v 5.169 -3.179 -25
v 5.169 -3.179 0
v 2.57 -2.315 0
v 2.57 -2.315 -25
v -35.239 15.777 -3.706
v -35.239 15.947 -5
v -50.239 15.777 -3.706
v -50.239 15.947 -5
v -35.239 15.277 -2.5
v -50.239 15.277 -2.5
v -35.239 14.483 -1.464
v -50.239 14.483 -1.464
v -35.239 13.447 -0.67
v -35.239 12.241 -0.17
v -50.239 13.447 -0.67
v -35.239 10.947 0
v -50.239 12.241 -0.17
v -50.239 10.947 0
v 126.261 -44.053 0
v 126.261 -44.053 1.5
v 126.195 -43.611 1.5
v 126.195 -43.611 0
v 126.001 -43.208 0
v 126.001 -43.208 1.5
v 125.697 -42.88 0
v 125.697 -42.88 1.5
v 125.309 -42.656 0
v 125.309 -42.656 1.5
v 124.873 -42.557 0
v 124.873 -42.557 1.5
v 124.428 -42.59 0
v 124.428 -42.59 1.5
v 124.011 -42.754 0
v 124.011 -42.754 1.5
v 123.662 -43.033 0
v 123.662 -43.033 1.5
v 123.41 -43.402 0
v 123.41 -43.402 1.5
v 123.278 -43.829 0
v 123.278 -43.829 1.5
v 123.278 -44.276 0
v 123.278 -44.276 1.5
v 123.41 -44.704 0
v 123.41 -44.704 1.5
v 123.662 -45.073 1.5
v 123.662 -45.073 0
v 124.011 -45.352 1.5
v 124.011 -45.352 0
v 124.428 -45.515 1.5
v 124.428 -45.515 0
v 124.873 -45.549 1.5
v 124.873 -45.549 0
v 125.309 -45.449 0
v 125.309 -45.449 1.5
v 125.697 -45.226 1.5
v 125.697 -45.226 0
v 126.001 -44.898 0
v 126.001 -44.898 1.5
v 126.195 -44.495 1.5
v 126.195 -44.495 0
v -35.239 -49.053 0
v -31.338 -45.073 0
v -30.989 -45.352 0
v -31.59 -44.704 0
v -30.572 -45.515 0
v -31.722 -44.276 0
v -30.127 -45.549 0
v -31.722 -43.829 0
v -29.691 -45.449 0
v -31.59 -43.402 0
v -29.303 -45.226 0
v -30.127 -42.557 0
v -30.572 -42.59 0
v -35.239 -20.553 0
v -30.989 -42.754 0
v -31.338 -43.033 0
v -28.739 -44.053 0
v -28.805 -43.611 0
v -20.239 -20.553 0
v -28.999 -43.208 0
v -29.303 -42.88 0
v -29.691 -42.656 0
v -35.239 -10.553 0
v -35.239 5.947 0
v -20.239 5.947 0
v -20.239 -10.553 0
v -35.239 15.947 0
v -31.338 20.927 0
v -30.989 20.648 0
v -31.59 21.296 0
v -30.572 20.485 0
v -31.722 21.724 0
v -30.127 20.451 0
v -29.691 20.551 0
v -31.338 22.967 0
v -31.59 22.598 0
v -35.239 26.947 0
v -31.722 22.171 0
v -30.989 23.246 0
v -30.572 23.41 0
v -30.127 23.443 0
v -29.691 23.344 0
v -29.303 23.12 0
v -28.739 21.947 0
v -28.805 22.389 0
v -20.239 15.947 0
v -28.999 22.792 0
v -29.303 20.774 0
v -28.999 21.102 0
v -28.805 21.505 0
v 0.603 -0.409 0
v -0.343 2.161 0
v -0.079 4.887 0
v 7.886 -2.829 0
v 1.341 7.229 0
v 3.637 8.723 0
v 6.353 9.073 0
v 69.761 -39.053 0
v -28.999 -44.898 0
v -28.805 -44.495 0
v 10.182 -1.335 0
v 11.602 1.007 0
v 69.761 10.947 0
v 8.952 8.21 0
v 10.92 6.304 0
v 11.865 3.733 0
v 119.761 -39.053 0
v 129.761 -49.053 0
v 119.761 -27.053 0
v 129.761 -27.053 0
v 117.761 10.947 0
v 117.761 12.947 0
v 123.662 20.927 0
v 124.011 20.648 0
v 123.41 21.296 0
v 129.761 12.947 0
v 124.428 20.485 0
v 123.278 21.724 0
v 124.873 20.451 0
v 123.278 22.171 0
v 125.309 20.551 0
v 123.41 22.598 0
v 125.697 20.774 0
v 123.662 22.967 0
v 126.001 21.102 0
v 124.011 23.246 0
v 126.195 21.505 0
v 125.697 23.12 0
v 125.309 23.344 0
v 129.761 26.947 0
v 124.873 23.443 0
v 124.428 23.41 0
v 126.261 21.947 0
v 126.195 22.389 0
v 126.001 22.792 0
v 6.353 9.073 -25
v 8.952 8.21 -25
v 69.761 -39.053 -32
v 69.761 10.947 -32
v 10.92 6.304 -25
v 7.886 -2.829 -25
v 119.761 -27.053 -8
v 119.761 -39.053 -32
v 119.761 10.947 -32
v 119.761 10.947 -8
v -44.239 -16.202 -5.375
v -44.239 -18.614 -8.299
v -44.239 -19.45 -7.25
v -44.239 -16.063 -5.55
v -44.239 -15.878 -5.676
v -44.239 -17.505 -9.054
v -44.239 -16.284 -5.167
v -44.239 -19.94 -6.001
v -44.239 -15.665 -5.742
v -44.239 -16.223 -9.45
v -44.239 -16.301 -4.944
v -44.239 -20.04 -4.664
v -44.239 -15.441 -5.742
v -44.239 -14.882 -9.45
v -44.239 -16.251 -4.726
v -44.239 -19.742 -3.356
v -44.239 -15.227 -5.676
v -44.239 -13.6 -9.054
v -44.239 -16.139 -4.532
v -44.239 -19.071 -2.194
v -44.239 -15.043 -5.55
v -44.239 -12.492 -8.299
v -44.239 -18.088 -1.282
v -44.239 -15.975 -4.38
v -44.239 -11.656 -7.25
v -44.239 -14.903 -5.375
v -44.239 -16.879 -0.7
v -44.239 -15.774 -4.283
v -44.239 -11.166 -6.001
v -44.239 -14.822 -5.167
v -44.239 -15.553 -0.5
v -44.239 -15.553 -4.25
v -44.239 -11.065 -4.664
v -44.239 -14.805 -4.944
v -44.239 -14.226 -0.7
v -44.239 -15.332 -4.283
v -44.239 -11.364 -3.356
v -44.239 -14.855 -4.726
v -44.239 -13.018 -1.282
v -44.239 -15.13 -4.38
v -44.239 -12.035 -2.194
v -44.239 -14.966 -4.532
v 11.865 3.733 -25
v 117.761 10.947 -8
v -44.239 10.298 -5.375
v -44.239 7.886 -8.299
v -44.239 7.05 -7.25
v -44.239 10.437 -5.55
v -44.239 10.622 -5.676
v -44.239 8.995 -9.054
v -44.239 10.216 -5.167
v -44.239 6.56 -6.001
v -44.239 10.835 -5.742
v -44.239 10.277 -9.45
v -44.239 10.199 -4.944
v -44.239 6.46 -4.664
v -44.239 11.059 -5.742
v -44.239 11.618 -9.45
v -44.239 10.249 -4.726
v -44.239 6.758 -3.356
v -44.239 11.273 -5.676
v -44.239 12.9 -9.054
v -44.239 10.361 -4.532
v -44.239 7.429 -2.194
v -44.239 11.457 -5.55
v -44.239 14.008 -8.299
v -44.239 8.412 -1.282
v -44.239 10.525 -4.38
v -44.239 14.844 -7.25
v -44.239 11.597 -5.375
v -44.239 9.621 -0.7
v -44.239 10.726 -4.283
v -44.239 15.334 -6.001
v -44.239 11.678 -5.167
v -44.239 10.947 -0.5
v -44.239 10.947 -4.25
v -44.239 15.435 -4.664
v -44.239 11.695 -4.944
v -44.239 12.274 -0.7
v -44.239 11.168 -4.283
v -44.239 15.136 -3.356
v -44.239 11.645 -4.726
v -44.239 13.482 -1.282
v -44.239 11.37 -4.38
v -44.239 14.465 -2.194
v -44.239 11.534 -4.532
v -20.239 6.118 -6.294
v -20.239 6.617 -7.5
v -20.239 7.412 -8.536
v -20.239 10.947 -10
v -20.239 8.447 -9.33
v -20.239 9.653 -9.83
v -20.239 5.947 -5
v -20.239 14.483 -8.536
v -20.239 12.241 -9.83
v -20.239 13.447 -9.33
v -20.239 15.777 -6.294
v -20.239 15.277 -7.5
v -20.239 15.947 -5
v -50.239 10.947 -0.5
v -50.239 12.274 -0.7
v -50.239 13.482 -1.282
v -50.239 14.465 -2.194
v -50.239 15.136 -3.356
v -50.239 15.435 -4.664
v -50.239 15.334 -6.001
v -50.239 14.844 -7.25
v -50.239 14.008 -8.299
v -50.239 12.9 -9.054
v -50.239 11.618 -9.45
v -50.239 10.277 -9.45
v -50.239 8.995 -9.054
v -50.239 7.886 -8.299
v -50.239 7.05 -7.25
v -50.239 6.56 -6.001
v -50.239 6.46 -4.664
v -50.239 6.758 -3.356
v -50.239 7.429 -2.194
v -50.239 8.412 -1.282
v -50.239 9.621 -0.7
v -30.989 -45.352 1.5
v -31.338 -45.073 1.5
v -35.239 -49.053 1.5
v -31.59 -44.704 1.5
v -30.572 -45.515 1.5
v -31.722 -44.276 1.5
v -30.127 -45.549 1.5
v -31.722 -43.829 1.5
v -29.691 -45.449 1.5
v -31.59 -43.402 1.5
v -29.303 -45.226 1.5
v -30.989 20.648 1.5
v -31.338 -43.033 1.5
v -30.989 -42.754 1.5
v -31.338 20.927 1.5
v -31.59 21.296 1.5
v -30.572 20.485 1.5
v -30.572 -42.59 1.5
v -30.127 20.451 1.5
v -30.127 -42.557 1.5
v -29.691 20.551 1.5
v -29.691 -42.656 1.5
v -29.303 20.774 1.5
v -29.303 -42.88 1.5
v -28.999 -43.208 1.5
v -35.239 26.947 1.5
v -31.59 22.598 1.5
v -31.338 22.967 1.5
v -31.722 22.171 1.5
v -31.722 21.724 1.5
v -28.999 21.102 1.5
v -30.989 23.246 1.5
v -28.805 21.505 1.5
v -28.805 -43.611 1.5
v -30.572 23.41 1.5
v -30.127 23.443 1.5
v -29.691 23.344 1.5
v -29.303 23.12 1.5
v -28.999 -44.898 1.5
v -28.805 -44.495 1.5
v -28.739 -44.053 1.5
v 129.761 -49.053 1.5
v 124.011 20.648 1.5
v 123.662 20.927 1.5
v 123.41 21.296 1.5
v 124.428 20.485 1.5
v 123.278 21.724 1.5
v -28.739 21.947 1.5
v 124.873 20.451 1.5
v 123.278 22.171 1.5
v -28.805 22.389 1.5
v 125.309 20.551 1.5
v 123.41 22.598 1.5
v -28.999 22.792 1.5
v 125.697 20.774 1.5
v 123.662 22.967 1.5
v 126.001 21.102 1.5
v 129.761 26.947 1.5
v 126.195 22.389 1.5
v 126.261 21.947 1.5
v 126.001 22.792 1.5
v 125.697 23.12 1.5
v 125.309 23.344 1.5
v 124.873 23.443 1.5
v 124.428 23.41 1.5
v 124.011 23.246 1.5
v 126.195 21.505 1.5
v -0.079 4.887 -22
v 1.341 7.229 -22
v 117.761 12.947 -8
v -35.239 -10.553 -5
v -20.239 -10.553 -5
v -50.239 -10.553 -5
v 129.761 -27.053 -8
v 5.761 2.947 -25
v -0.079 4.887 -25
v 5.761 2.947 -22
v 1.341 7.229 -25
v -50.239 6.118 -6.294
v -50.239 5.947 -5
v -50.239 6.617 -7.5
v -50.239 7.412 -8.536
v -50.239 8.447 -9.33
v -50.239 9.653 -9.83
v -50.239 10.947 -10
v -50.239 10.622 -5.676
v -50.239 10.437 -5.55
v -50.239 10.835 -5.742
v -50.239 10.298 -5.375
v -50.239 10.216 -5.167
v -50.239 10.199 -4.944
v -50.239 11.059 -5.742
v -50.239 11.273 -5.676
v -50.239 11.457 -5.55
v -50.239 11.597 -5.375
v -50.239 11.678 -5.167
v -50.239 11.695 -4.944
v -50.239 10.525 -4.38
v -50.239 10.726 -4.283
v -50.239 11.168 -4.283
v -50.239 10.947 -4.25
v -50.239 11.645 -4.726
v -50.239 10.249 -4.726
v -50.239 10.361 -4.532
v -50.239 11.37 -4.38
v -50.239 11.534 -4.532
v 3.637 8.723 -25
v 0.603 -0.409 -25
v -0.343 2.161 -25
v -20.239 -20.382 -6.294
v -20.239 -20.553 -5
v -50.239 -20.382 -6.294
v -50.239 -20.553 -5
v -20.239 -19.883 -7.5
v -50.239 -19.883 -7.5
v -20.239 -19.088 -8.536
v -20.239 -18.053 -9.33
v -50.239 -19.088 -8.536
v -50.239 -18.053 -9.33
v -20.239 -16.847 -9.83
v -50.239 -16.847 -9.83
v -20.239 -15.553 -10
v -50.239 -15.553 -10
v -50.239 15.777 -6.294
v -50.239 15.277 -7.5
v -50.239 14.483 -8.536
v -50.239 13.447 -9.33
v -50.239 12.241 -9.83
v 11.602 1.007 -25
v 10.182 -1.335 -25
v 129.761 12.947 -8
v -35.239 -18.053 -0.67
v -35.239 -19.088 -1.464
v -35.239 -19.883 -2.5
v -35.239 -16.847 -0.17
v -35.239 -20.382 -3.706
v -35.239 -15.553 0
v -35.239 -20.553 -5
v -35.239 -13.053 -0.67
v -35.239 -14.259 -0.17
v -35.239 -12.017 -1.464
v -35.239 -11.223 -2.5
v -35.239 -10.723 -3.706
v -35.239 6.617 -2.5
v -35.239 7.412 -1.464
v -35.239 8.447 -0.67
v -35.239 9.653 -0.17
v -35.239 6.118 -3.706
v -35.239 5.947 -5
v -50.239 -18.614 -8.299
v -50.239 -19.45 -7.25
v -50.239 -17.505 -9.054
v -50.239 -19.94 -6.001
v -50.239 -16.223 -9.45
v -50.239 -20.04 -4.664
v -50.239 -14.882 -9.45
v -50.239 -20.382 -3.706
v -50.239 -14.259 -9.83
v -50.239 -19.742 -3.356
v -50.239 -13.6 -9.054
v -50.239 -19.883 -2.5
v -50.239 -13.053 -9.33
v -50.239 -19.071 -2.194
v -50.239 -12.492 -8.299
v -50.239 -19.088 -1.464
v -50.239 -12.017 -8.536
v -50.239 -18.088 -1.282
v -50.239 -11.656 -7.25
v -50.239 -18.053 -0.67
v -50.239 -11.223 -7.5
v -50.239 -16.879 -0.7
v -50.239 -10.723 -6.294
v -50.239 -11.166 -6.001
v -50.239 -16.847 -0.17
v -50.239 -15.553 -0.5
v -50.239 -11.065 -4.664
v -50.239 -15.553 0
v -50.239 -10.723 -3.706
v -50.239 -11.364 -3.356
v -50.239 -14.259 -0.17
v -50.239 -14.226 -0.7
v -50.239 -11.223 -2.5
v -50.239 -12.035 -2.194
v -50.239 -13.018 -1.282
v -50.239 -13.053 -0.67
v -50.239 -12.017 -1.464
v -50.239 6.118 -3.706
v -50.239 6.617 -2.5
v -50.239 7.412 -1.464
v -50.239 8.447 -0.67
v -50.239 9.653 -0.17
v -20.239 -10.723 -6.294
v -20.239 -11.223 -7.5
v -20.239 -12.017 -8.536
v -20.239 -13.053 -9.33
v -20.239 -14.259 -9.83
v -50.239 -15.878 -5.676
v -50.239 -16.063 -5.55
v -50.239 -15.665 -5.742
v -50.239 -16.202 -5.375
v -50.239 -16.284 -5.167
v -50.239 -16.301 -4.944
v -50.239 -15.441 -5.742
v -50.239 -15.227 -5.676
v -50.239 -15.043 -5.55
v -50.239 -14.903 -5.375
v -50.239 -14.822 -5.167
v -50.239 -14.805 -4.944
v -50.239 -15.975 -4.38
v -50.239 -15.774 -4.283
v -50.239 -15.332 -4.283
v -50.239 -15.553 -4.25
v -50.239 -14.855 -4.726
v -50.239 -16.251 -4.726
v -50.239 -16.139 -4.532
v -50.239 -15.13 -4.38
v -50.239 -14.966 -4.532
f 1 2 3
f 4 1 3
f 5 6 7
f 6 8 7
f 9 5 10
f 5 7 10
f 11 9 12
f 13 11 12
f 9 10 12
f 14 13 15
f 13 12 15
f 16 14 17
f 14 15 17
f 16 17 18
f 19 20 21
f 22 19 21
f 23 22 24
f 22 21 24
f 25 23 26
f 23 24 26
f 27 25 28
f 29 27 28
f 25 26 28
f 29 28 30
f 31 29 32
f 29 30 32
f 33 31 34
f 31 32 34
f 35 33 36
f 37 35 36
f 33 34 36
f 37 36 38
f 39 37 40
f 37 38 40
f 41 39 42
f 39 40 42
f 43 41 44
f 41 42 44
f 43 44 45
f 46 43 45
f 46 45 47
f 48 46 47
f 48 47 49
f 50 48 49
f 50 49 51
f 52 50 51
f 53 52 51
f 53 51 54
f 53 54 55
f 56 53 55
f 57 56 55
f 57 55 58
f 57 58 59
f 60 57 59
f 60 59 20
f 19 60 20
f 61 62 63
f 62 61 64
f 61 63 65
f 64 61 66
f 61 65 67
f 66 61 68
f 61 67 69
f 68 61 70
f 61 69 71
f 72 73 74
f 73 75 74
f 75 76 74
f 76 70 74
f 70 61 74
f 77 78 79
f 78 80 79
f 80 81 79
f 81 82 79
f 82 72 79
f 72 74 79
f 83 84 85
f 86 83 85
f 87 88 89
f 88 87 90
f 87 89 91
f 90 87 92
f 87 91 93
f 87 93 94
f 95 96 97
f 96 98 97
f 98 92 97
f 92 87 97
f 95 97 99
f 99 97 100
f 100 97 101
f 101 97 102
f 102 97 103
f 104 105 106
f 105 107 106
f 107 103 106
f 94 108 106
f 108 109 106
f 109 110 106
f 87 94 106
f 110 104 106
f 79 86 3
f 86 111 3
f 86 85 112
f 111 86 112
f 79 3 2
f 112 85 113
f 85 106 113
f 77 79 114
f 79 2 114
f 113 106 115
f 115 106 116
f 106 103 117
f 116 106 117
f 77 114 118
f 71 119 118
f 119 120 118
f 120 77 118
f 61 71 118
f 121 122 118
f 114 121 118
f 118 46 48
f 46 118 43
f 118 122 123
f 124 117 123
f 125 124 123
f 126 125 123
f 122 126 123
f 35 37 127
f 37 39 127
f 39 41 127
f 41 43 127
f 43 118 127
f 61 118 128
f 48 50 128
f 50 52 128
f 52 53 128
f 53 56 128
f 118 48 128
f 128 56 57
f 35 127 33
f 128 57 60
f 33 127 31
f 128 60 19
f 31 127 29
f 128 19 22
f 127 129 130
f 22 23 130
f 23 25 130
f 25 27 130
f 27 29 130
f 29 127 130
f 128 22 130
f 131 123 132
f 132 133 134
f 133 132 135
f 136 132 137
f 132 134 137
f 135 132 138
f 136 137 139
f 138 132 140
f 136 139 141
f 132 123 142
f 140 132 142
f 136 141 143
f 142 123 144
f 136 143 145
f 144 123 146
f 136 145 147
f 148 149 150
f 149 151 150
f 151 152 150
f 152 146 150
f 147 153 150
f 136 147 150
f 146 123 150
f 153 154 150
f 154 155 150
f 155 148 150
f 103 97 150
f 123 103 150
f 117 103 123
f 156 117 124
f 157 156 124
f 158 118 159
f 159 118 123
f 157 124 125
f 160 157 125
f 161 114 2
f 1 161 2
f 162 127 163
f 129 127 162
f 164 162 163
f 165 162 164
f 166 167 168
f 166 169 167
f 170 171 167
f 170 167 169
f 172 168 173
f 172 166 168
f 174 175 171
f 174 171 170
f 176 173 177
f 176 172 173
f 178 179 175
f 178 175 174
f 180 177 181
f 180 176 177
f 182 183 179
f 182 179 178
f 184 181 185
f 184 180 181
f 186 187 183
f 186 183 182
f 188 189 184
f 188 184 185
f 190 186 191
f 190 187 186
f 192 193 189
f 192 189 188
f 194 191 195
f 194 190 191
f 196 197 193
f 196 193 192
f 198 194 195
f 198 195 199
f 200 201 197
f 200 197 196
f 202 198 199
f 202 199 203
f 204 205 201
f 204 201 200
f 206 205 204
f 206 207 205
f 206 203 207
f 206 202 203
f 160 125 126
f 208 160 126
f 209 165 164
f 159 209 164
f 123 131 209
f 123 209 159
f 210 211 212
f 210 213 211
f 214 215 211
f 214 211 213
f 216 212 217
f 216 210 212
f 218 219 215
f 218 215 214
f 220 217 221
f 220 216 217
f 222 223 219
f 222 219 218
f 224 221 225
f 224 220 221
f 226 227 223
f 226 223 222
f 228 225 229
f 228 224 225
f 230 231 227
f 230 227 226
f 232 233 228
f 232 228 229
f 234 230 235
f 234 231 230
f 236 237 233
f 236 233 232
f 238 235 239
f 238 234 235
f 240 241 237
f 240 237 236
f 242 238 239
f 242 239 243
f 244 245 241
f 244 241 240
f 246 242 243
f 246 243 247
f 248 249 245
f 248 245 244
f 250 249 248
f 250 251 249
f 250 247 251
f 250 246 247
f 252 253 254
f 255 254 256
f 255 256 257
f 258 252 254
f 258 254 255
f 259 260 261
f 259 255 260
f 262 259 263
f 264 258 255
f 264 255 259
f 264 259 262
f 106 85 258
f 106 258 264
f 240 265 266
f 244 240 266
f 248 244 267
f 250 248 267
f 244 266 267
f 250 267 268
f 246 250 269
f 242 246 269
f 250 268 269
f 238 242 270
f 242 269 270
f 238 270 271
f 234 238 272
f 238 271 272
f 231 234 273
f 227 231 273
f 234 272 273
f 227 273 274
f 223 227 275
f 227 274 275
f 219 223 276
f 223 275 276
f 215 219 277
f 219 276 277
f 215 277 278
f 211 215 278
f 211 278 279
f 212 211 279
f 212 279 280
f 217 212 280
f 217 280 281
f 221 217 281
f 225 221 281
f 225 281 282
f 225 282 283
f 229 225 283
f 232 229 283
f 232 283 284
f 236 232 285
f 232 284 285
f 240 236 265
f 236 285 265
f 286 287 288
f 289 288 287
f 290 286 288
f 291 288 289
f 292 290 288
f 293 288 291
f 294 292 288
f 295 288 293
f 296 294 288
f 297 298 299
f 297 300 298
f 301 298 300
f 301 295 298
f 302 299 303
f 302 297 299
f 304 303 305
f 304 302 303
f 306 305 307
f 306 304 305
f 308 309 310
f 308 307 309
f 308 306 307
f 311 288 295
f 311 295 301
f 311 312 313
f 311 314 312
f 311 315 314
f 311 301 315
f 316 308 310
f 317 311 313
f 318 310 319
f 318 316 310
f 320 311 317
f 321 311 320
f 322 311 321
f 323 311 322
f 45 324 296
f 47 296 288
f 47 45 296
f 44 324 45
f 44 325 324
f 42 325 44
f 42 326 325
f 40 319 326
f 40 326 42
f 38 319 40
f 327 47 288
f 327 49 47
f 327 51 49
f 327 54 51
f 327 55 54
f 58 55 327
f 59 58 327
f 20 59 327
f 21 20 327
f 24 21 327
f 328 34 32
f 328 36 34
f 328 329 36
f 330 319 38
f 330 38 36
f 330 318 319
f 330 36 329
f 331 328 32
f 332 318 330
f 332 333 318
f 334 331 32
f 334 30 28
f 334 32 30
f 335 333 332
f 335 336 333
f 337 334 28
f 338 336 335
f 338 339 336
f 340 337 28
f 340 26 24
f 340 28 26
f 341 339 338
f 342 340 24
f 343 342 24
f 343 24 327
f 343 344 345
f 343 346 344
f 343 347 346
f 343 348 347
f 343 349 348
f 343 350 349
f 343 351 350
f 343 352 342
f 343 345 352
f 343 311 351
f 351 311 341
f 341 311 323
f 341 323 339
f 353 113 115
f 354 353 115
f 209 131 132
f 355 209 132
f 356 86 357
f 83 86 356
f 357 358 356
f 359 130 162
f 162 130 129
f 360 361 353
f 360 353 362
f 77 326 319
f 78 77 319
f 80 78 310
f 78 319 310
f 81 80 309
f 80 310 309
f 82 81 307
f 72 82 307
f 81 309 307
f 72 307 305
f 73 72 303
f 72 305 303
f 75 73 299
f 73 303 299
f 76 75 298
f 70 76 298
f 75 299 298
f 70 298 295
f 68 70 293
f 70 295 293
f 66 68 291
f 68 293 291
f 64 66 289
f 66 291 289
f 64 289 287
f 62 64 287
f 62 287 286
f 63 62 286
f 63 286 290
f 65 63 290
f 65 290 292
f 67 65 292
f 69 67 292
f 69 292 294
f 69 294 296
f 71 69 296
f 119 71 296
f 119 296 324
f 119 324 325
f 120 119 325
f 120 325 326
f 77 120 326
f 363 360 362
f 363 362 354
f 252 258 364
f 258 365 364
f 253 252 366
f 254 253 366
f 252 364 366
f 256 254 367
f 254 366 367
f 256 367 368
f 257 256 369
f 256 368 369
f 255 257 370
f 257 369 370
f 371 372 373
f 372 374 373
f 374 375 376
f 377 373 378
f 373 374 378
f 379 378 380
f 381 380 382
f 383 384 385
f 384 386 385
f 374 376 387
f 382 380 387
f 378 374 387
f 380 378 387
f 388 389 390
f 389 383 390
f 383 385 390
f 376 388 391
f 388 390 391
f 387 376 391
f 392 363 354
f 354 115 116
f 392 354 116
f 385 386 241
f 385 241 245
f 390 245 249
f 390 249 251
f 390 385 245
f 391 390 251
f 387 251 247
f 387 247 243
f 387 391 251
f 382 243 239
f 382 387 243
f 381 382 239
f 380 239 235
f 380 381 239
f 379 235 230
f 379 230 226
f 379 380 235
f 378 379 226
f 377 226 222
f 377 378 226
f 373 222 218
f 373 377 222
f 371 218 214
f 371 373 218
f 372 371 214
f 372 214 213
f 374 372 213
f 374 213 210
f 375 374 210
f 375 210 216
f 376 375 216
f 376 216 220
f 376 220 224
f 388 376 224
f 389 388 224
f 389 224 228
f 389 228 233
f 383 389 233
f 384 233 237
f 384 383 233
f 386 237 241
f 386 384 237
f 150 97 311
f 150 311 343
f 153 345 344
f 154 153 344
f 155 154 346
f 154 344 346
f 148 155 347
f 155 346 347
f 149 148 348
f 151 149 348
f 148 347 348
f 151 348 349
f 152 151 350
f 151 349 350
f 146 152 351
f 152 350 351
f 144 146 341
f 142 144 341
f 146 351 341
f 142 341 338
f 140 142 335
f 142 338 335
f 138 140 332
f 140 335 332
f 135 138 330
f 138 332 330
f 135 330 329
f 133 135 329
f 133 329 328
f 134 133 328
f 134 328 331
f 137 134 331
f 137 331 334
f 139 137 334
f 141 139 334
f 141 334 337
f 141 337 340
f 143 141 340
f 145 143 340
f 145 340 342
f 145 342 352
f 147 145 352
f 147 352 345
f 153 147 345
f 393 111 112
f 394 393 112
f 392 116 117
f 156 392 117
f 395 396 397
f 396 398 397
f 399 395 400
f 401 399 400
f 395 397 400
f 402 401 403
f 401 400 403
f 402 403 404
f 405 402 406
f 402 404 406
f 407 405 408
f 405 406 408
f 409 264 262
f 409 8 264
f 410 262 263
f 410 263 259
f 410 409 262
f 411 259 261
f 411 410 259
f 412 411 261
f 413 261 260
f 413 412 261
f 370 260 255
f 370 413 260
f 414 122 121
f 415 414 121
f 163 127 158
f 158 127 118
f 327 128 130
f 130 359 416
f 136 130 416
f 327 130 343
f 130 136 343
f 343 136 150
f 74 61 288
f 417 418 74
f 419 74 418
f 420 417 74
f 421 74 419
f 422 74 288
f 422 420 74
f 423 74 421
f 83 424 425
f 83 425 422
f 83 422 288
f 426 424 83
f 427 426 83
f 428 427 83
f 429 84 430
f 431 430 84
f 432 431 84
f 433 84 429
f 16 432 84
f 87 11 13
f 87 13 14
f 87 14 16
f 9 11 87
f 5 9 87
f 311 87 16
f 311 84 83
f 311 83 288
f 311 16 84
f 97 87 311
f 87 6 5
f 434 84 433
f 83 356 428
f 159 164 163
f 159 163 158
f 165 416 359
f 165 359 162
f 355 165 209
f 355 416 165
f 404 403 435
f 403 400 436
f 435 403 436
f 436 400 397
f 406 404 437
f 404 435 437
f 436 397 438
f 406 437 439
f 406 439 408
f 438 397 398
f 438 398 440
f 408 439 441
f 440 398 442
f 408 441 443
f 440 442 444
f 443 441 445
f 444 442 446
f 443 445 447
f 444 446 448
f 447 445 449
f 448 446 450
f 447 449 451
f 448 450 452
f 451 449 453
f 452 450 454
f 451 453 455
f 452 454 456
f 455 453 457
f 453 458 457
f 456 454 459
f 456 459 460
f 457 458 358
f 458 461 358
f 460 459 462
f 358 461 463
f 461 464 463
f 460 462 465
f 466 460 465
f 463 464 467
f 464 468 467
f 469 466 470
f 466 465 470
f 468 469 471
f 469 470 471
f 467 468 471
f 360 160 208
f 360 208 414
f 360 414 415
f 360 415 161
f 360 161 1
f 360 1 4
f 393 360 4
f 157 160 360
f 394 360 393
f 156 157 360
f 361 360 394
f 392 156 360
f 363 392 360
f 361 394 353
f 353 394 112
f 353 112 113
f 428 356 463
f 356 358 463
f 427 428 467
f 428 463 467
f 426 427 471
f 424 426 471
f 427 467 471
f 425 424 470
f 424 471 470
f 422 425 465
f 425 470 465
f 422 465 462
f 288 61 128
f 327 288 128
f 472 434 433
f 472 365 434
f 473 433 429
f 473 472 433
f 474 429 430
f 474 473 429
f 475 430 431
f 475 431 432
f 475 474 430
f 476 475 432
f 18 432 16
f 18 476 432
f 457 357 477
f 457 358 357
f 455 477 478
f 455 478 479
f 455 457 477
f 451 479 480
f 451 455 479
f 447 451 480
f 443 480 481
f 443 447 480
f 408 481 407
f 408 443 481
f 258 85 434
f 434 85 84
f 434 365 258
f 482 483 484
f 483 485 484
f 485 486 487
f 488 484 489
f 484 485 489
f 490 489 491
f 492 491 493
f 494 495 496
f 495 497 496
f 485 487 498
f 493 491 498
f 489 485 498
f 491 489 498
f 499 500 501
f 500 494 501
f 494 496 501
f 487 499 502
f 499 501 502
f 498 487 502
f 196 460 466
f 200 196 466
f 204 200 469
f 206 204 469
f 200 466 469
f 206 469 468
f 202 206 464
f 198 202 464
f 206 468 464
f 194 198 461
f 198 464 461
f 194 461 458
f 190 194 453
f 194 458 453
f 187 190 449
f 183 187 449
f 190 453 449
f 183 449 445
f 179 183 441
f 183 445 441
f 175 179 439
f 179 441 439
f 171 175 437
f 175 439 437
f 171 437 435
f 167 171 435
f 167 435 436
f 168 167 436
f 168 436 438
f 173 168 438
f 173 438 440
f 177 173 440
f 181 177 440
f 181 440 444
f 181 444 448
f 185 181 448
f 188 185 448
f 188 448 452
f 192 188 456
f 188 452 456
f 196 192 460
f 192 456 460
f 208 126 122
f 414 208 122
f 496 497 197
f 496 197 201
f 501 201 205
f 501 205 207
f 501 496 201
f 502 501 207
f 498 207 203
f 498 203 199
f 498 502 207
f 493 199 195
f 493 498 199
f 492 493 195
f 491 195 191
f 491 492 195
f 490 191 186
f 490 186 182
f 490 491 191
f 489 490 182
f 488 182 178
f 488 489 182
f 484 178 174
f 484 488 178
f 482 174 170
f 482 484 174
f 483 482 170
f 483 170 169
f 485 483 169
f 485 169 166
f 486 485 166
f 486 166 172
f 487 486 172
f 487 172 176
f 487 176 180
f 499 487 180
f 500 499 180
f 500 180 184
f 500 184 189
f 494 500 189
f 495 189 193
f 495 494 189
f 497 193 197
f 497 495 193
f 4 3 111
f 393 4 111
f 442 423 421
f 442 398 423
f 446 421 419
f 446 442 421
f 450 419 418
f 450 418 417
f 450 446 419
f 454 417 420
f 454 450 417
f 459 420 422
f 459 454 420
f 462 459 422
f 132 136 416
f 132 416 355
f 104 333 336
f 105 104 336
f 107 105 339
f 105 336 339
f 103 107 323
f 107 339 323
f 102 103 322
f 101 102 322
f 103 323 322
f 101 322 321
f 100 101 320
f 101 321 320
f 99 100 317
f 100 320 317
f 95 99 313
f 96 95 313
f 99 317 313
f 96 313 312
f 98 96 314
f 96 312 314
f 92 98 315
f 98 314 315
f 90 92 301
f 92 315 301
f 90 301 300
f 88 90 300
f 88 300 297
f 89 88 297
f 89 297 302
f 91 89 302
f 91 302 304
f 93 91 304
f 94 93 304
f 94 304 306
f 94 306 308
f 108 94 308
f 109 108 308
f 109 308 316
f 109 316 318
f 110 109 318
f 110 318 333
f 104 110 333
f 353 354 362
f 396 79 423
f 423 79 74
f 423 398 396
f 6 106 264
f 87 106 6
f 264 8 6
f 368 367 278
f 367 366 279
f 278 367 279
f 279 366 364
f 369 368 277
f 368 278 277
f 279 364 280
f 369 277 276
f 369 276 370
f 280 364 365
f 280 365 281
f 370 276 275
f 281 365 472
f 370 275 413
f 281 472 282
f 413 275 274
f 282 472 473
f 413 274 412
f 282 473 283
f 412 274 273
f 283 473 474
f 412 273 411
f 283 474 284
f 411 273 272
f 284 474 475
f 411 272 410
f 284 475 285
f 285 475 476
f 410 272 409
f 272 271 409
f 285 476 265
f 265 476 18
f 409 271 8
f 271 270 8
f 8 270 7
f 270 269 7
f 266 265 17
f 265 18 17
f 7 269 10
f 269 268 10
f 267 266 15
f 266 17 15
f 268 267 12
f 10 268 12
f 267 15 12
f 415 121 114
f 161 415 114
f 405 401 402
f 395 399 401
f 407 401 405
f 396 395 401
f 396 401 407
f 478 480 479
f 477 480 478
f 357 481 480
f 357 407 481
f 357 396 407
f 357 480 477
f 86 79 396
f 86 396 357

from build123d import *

# Parameters (mm, degrees)
SKETCH1_W           = 165
SKETCH1_H           = 76
BOSS_EXTRUDE1_DEPTH = 1.5
CUT_EXTRUDE1_REACH  = 140.731
SKETCH2_R           = 1.5
SKETCH3_W           = 12
SKETCH3_H           = 40
BOSS_EXTRUDE2_DEPTH = 8
SKETCH4_W           = 50
SKETCH4_H           = 50
BOSS_EXTRUDE3_DEPTH = 32
SKETCH5_W           = 30
SKETCH5_H           = 10
BOSS_EXTRUDE4_DEPTH = 10
BOSS_EXTRUDE5_DEPTH = 25
FILLET2_R           = 5
SKETCH8_R           = 4.5
SKETCH8_R_2         = 0.75
CUT_EXTRUDE2_DEPTH  = 6
CUT_EXTRUDE3_DEPTH  = 3


with BuildPart() as part:
    # Sketch1 → Boss-Extrude1 (new body)
    with BuildSketch(Plane.XY):
        with Locations((47.261306533, -11.052763819)):
            Rectangle(SKETCH1_W, SKETCH1_H)
    extrude(amount=BOSS_EXTRUDE1_DEPTH)

    # Sketch2 → Cut-Extrude1 (cut, up to next)
    with BuildSketch(Plane.XY.offset(1.5), mode=Mode.PRIVATE) as cut_extrude1_sk1:
        with Locations((124.761306533, 21.947236181)):
            Circle(SKETCH2_R)
    cut_extrude1_tool1 = extrude(cut_extrude1_sk1.sketch, amount=-CUT_EXTRUDE1_REACH, mode=Mode.PRIVATE) & part.part
    # Sketch2 → Cut-Extrude1 (cut, up to next)
    with BuildSketch(Plane.XY.offset(1.5), mode=Mode.PRIVATE) as cut_extrude1_sk2:
        with Locations((124.761306533, -44.052763819)):
            Circle(SKETCH2_R)
    cut_extrude1_tool2 = extrude(cut_extrude1_sk2.sketch, amount=-CUT_EXTRUDE1_REACH, mode=Mode.PRIVATE) & part.part
    # Sketch2 → Cut-Extrude1 (cut, up to next)
    with BuildSketch(Plane.XY.offset(1.5), mode=Mode.PRIVATE) as cut_extrude1_sk3:
        with Locations((-30.238693467, -44.052763819)):
            Circle(SKETCH2_R)
    cut_extrude1_tool3 = extrude(cut_extrude1_sk3.sketch, amount=-CUT_EXTRUDE1_REACH, mode=Mode.PRIVATE) & part.part
    # Sketch2 → Cut-Extrude1 (cut, up to next)
    with BuildSketch(Plane.XY.offset(1.5), mode=Mode.PRIVATE) as cut_extrude1_sk4:
        with Locations((-30.238693467, 21.947236181)):
            Circle(SKETCH2_R)
    cut_extrude1_tool4 = extrude(cut_extrude1_sk4.sketch, amount=-CUT_EXTRUDE1_REACH, mode=Mode.PRIVATE) & part.part
    add(cut_extrude1_tool1.solids().sort_by_distance((124.761307, 21.947236, 1.5))[0], mode=Mode.SUBTRACT)
    add(cut_extrude1_tool2.solids().sort_by_distance((124.761307, -44.052764, 1.5))[0], mode=Mode.SUBTRACT)
    add(cut_extrude1_tool3.solids().sort_by_distance((-30.238693, -44.052764, 1.5))[0], mode=Mode.SUBTRACT)
    add(cut_extrude1_tool4.solids().sort_by_distance((-30.238693, 21.947236, 1.5))[0], mode=Mode.SUBTRACT)

    # Sketch3 → Boss-Extrude2 (add)
    with BuildSketch(Plane(origin=(0, 0, 0), x_dir=(-1, 0, 0), z_dir=(0, 0, -1))):
        with Locations((-123.761306533, -7.052763819)):
            Rectangle(SKETCH3_W, SKETCH3_H)
    extrude(amount=BOSS_EXTRUDE2_DEPTH)

    # Sketch4 → Boss-Extrude3 (add)
    with BuildSketch(Plane(origin=(0, 0, 0), x_dir=(-1, 0, 0), z_dir=(0, 0, -1))):
        with Locations((-94.761306533, -14.052763819)):
            Rectangle(SKETCH4_W, SKETCH4_H)
    extrude(amount=BOSS_EXTRUDE3_DEPTH)

    # Sketch5 → Boss-Extrude4 (add)
    with BuildSketch(Plane(origin=(0, 0, 0), x_dir=(-1, 0, 0), z_dir=(0, 0, -1))):
        with Locations((35.238693467, 10.947236181)):
            Rectangle(SKETCH5_W, SKETCH5_H)
        with Locations((35.238693467, -15.552763819)):
            Rectangle(SKETCH5_W, SKETCH5_H)
    extrude(amount=BOSS_EXTRUDE4_DEPTH)

    # Sketch6 → Boss-Extrude5 (add)
    with BuildSketch(Plane(origin=(0, 0, 0), x_dir=(-1, 0, 0), z_dir=(0, 0, -1))):
        Polygon((0.079164122, 4.887423166), (-1.341039882, 7.229369498), (-3.636731908, 8.72318681), (-6.353221994, 9.073006263), (-8.952475964, 8.209541823), (-10.919679691, 6.303813212), (-11.86520435, 3.733273355), (-11.601777188, 1.007049196), (-10.181573183, -1.334897137), (-7.885881157, -2.828714449), (-5.169391071, -3.178533901), (-2.570137101, -2.315069461), (-0.602933374, -0.409340851), (0.342591285, 2.161199006), align=None)
    extrude(amount=BOSS_EXTRUDE5_DEPTH)

    # Fillet2
    fillet2_edges = [part.edges().sort_by_distance(p)[0] for p in [
        (-42.738693467, 5.947236181, 0),
        (-42.738693467, 15.947236181, 0),
        (-35.238693467, 15.947236181, -10),
        (-35.238693467, 5.947236181, -10),
        (-42.738693467, -20.552763819, 0),
        (-42.738693467, -10.552763819, 0),
        (-35.238693467, -10.552763819, -10),
        (-35.238693467, -20.552763819, -10),
    ]]
    fillet(fillet2_edges, radius=FILLET2_R - 0.0001)  # a hair under: the kernel refuses the full size

    # Sketch8 → Cut-Extrude2 (cut)
    # profile 1 of 2: a face of its own
    with BuildSketch(Plane.ZY.offset(50.238693467)):
        with Locations((-5, -15.552763819)):
            Circle(SKETCH8_R)
        with Locations((-5, -15.552763819)):
            Circle(SKETCH8_R_2, mode=Mode.SUBTRACT)
    # profile 2 of 2: a face of its own
    with BuildSketch(Plane.ZY.offset(50.238693467)):
        with Locations((-5, 10.947236181)):
            Circle(SKETCH8_R)
        with Locations((-5, 10.947236181)):
            Circle(SKETCH8_R_2, mode=Mode.SUBTRACT)
    extrude(amount=-CUT_EXTRUDE2_DEPTH, mode=Mode.SUBTRACT)

    # Sketch10 → Cut-Extrude3 (cut)
    with BuildSketch(Plane(origin=(0, 0, -25), x_dir=(-1, 0, 0), z_dir=(0, 0, -1))):
        Polygon((-5.761306533, 2.947236181), (-1.341039882, 7.229369498), (0.079164122, 4.887423166), align=None)
    extrude(amount=-CUT_EXTRUDE3_DEPTH, mode=Mode.SUBTRACT)


solid = part.part
